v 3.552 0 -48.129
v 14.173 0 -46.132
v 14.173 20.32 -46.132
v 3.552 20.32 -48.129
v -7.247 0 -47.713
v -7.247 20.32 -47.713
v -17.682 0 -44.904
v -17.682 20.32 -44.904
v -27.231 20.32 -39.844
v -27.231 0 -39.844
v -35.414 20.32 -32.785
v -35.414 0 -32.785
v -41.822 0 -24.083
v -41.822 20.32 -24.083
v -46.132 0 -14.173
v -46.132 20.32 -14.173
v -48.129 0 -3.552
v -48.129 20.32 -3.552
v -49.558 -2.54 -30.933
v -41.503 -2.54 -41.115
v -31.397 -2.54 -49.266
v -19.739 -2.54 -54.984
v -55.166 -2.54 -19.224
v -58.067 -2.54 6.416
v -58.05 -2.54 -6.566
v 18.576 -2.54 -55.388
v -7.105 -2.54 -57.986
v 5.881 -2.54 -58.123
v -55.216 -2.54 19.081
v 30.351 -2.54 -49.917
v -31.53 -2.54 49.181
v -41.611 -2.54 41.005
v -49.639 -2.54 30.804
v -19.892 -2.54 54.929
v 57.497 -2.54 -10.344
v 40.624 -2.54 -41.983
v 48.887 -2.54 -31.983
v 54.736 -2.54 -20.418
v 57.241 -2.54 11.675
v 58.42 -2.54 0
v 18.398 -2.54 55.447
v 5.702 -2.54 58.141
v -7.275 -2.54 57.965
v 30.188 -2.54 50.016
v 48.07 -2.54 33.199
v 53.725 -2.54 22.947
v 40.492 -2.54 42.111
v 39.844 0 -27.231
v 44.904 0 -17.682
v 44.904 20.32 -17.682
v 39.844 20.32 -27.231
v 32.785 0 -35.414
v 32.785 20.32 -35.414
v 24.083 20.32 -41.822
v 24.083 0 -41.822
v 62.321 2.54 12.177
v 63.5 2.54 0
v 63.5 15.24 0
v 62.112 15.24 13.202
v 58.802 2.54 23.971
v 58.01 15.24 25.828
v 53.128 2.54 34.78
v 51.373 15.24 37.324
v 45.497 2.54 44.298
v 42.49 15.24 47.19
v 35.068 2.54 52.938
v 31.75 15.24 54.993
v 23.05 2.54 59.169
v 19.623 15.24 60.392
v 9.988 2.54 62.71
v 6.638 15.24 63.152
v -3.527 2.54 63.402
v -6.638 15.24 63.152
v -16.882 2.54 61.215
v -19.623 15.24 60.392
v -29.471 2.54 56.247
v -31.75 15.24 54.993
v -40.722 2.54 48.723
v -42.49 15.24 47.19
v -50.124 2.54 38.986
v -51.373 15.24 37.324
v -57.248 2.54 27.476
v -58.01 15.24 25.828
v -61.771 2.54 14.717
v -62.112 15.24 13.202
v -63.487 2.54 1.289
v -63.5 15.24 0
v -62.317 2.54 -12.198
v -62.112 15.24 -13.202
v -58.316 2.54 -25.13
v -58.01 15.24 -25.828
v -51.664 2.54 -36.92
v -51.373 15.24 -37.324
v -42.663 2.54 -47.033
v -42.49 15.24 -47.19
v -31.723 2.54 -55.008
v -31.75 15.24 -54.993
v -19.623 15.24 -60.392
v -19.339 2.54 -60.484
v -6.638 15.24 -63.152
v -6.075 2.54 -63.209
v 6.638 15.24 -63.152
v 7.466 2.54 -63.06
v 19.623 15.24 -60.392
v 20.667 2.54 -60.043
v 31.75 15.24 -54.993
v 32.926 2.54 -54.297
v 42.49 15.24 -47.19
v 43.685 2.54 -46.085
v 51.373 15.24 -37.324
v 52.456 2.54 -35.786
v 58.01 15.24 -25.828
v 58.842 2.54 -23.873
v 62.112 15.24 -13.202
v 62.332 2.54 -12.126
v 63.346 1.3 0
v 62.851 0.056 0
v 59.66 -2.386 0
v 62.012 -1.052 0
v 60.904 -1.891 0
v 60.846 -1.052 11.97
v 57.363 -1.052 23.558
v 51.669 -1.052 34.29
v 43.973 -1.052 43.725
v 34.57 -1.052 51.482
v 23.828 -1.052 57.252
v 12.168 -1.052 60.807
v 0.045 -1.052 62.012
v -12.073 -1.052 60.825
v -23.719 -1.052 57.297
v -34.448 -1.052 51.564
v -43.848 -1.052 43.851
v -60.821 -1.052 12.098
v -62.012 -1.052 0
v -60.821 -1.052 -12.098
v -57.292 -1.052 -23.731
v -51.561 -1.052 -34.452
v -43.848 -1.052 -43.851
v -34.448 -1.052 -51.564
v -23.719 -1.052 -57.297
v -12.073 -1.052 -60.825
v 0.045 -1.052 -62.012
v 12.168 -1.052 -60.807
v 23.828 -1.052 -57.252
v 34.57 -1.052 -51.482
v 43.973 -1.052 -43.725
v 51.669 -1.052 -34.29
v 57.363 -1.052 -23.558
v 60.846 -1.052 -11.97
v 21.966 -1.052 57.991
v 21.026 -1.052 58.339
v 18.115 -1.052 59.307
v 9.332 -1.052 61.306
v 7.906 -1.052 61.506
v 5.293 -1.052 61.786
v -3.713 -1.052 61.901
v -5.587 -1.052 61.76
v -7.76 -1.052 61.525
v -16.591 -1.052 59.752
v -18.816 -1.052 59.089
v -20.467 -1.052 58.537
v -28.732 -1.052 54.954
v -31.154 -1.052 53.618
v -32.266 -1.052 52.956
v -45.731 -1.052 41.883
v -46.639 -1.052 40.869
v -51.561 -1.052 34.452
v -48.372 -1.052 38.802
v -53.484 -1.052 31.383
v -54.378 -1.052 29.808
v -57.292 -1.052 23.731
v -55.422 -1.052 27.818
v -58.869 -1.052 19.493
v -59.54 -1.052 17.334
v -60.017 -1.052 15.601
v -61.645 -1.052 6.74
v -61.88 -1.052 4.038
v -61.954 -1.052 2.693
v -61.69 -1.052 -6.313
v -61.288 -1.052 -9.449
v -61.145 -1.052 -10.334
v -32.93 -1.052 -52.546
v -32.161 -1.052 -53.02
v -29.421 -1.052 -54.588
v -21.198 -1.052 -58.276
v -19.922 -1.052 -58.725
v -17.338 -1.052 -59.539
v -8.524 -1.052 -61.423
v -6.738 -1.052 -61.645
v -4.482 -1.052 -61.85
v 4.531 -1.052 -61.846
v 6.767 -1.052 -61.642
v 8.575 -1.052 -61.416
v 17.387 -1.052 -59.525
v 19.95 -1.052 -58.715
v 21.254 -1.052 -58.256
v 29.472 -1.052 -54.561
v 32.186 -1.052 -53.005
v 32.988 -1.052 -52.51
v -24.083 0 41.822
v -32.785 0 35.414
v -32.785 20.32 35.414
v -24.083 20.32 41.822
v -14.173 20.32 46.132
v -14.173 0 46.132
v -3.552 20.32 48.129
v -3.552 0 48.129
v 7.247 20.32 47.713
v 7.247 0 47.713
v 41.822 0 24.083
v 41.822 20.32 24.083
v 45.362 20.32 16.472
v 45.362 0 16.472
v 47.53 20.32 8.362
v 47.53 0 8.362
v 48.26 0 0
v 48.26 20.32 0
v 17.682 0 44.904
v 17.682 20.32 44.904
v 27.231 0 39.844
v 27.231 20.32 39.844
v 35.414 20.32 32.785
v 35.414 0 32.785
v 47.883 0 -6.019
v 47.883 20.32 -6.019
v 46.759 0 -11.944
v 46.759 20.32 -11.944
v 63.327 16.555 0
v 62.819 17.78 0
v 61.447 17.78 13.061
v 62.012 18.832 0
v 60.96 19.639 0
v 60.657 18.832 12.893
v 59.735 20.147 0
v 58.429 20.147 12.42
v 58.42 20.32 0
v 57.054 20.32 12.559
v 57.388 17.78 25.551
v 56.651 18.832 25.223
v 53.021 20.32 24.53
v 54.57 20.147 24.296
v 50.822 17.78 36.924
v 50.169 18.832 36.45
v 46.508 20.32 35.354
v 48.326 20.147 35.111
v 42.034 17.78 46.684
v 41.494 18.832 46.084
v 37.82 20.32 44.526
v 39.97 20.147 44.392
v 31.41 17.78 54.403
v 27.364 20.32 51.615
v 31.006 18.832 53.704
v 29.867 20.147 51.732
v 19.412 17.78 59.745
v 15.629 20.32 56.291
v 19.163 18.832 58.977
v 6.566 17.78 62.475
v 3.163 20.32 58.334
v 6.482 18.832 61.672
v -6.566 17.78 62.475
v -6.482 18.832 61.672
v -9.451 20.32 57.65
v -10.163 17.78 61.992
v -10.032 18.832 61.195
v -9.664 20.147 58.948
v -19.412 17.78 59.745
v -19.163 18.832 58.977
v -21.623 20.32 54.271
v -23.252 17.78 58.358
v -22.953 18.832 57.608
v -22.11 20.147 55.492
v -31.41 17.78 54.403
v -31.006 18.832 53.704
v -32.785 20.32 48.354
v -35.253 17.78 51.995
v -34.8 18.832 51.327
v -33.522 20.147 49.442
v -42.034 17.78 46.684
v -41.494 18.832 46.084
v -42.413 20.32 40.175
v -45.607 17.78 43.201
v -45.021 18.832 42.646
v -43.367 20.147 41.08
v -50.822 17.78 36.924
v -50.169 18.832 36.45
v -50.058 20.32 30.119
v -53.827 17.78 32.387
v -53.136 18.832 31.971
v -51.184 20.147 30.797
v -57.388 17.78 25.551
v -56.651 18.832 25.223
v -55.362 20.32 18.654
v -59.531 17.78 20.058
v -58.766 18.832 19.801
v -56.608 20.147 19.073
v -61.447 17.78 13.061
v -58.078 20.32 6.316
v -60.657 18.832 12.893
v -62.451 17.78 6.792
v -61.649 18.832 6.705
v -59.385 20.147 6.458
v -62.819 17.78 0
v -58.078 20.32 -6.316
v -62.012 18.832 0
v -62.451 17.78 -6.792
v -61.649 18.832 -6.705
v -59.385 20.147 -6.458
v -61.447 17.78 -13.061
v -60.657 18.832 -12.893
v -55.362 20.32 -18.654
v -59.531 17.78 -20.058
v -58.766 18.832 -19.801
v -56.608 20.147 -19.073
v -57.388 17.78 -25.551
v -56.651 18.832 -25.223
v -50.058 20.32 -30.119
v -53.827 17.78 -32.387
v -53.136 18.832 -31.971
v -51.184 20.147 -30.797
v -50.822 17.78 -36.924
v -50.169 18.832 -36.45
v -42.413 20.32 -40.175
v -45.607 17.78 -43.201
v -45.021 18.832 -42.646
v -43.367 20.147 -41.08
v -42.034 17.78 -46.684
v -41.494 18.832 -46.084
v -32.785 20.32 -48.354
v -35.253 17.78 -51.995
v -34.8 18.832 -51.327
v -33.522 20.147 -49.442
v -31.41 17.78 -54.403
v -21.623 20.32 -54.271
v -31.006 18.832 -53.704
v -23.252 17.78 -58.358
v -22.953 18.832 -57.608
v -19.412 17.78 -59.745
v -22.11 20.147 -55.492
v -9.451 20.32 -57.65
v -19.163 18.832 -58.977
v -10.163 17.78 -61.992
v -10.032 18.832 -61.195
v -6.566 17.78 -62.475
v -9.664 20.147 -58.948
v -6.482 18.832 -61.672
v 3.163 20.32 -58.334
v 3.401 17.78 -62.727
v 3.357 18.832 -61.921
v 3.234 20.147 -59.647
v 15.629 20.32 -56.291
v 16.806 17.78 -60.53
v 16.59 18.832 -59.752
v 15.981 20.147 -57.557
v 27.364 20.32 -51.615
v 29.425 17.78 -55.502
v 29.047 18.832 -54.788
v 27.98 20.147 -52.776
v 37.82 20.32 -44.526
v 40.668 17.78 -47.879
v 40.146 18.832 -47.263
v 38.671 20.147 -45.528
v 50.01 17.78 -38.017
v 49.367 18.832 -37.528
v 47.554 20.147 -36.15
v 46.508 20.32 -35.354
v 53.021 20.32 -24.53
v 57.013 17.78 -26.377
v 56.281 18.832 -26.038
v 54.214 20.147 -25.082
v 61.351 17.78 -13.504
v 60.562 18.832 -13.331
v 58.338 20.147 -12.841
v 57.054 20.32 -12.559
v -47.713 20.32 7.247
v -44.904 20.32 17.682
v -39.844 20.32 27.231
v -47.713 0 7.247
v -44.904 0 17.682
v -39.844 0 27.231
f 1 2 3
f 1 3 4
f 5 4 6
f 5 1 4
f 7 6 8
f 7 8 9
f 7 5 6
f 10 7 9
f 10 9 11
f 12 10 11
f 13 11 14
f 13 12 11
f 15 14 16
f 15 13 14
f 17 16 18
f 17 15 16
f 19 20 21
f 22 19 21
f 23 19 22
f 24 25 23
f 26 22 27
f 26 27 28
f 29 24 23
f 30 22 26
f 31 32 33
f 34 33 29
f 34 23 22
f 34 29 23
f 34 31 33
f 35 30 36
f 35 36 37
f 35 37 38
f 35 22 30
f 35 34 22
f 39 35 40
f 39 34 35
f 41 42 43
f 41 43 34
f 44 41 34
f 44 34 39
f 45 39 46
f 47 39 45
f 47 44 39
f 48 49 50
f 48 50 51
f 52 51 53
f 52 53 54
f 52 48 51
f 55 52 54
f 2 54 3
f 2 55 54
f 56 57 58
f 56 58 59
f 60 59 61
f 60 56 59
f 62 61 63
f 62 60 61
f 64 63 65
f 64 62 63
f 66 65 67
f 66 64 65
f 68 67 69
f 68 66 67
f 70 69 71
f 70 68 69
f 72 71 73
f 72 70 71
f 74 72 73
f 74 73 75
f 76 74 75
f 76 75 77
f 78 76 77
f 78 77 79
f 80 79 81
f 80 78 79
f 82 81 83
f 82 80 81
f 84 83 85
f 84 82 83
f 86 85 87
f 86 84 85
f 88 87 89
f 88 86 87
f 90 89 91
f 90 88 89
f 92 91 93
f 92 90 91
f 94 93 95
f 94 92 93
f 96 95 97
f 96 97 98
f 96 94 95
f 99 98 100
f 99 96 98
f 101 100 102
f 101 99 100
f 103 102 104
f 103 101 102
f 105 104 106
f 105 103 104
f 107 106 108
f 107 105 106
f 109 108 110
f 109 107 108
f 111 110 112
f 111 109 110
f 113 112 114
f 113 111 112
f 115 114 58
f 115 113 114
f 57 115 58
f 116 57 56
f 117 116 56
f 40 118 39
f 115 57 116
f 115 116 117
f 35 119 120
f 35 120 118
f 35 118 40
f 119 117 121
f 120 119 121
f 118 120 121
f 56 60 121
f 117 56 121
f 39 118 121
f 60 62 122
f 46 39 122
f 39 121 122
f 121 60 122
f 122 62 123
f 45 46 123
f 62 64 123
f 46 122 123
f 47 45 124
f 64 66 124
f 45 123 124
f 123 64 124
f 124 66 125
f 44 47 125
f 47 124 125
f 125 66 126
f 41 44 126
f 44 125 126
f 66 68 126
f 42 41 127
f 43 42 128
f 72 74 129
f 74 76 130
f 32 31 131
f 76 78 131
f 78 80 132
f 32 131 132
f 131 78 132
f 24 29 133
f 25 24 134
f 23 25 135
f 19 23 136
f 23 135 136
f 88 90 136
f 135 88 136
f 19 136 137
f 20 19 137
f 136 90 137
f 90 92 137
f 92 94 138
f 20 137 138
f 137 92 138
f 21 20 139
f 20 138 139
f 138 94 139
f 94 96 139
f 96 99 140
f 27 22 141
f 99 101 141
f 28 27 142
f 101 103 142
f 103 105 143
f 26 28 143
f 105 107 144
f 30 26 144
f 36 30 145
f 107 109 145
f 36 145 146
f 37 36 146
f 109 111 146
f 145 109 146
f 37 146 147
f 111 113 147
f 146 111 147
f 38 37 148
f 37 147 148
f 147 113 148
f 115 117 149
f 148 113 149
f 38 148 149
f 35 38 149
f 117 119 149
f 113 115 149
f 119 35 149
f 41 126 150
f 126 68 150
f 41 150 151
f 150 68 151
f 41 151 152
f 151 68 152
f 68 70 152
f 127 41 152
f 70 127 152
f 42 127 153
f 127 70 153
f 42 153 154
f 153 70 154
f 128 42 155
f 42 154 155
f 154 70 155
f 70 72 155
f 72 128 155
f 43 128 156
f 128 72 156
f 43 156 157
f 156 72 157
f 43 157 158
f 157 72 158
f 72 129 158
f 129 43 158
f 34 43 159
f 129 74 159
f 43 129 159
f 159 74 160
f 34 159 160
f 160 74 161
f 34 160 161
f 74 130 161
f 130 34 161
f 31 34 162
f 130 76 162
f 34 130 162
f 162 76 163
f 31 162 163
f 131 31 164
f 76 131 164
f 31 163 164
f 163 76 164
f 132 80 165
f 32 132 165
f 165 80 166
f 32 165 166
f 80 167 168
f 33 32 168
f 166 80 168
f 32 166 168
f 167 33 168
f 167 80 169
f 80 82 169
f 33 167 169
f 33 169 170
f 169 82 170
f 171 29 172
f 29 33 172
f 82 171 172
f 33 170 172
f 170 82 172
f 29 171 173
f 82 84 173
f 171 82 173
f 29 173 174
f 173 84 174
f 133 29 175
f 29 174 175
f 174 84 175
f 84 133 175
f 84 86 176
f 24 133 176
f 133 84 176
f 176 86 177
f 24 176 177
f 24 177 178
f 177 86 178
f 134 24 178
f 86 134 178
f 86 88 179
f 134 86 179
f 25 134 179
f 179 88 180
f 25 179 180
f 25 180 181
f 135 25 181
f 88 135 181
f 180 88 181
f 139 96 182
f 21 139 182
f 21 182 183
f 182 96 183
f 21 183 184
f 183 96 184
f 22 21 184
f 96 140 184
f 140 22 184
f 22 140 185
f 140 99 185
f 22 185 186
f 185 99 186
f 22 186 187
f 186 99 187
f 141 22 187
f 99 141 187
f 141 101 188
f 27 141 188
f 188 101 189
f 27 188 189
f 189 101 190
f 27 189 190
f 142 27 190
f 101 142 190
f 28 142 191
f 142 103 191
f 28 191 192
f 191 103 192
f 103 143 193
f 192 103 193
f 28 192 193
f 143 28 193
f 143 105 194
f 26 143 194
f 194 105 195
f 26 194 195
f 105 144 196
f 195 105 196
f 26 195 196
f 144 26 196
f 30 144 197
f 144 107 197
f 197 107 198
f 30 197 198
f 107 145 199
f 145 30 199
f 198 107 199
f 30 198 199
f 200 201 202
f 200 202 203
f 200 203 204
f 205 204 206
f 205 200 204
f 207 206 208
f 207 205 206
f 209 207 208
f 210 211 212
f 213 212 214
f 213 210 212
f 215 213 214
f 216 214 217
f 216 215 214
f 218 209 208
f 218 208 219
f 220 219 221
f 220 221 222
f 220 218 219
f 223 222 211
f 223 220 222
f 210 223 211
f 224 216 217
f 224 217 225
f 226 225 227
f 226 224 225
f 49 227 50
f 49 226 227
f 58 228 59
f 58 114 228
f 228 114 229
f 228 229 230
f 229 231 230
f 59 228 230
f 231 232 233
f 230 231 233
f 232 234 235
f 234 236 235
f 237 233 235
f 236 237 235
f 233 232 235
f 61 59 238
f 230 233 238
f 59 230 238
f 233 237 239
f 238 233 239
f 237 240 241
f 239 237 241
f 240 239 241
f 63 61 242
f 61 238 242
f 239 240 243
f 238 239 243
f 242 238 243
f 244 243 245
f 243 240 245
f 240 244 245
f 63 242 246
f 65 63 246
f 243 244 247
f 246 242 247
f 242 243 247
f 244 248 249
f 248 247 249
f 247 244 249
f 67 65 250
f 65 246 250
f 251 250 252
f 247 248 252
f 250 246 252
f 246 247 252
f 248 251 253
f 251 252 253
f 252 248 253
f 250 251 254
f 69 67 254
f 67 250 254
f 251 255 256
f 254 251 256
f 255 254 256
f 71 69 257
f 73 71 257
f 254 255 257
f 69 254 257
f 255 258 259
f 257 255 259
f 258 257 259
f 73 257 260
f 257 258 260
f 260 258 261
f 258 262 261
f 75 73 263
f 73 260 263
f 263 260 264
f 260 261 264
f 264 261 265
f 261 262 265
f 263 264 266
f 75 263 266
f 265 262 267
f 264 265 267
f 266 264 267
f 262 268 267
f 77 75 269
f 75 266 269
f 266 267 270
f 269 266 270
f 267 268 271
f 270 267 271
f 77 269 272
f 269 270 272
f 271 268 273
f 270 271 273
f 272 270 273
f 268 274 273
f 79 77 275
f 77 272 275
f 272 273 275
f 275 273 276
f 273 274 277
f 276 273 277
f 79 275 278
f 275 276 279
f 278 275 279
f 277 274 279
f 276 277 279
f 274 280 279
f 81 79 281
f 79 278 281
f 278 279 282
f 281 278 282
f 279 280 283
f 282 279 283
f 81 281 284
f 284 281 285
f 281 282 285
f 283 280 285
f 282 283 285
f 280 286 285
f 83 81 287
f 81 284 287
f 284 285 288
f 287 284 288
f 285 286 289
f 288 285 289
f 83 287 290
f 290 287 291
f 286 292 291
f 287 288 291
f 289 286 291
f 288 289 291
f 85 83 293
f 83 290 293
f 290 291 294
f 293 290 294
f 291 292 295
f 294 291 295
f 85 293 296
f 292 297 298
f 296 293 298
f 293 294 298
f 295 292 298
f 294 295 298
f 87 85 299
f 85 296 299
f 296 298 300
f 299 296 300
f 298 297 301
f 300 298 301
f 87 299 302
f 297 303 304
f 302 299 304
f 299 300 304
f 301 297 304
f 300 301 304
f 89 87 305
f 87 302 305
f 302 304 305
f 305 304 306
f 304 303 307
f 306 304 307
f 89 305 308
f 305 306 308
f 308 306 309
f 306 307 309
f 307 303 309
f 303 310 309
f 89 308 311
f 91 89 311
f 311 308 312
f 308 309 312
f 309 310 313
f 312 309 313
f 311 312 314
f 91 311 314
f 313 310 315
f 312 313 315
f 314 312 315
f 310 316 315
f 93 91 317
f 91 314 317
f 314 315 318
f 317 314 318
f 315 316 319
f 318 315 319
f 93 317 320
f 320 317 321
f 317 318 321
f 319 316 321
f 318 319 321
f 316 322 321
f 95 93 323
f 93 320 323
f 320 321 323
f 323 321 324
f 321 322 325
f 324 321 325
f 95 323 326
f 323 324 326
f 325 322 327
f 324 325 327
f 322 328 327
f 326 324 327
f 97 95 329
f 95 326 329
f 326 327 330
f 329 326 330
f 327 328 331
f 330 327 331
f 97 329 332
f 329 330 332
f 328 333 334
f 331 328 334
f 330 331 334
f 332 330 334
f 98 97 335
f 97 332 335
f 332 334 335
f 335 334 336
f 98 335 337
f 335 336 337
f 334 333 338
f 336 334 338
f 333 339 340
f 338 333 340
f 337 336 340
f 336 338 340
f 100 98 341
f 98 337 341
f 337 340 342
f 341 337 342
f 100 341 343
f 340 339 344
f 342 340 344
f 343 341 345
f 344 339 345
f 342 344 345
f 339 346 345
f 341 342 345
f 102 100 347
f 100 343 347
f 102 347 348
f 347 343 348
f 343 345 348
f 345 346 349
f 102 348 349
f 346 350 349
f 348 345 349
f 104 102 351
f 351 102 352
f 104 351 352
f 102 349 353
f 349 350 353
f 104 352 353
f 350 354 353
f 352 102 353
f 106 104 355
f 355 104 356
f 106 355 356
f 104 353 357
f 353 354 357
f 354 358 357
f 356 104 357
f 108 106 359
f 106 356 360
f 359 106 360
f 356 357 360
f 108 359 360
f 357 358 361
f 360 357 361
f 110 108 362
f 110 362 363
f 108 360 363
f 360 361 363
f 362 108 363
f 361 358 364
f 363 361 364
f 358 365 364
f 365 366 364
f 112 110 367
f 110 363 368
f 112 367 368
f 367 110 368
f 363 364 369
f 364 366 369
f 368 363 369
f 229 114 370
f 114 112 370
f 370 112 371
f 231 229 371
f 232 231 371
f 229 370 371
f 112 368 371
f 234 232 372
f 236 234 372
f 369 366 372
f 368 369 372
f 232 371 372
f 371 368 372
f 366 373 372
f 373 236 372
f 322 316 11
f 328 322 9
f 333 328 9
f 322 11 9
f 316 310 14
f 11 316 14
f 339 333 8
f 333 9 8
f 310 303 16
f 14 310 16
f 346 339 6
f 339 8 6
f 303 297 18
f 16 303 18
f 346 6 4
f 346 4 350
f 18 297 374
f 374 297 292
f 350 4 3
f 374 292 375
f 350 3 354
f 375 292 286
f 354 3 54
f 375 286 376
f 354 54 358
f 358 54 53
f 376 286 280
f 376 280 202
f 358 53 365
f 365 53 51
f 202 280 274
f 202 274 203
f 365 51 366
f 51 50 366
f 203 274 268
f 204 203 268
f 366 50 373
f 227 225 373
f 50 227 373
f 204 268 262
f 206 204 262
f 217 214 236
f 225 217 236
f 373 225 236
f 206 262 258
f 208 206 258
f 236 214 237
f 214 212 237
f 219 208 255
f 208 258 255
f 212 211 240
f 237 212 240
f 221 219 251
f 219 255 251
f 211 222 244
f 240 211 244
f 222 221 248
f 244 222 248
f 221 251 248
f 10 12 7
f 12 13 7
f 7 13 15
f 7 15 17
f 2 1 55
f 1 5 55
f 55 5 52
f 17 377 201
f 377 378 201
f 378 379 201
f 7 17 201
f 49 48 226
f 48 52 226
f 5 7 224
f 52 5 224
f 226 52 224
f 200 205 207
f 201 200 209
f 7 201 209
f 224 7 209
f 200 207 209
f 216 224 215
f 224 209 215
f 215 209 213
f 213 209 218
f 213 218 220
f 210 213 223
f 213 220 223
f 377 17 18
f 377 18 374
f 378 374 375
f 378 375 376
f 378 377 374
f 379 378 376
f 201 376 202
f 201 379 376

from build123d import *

# Parameters (mm, degrees)
F0_R     = 63.5
F1_DEPTH = 20.32
F2_R     = 63.5
F3_DEPTH = 2.54
F4_R     = 5.08


with BuildPart() as f1:
    # F0 (on Front) → F1 (new body)
    with BuildSketch(Plane.XZ):
        Circle(F0_R)
        with BuildLine():
            ThreePointArc((41.82162, 24.082768), (46.622628, 12.464274), (48.26, 0))
            ThreePointArc((48.26, 0), (47.413582, -8.998878), (44.90402, -17.682099))
            ThreePointArc((44.90402, -17.682099), (32.785149, -35.414144), (14.172777, -46.131985))
            ThreePointArc((14.172777, -46.131985), (-7.246687, -47.712819), (-27.230856, -39.843545))
            ThreePointArc((-27.230856, -39.843545), (-41.82162, -24.082768), (-48.129099, -3.552103))
            ThreePointArc((-48.129099, -3.552103), (-44.90402, 17.682099), (-32.785149, 35.414144))
            ThreePointArc((-32.785149, 35.414144), (-14.172777, 46.131985), (7.246687, 47.712819))
            ThreePointArc((7.246687, 47.712819), (27.230856, 39.843545), (41.82162, 24.082768))
        make_face(mode=Mode.SUBTRACT)
    extrude(amount=-F1_DEPTH)

    # F2 (on Front) → F3 (join)
    with BuildSketch(Plane.XZ):
        Circle(F2_R)
    extrude(amount=F3_DEPTH)

    # F4
    f4_edges = [f1.edges().sort_by_distance(p)[0] for p in [
        (-63.5, -2.54, 0),
        (-63.5, 20.32, 0),
        (63.5, 8.89, 0),
    ]]
    fillet(f4_edges, radius=F4_R)


solid = f1.part
